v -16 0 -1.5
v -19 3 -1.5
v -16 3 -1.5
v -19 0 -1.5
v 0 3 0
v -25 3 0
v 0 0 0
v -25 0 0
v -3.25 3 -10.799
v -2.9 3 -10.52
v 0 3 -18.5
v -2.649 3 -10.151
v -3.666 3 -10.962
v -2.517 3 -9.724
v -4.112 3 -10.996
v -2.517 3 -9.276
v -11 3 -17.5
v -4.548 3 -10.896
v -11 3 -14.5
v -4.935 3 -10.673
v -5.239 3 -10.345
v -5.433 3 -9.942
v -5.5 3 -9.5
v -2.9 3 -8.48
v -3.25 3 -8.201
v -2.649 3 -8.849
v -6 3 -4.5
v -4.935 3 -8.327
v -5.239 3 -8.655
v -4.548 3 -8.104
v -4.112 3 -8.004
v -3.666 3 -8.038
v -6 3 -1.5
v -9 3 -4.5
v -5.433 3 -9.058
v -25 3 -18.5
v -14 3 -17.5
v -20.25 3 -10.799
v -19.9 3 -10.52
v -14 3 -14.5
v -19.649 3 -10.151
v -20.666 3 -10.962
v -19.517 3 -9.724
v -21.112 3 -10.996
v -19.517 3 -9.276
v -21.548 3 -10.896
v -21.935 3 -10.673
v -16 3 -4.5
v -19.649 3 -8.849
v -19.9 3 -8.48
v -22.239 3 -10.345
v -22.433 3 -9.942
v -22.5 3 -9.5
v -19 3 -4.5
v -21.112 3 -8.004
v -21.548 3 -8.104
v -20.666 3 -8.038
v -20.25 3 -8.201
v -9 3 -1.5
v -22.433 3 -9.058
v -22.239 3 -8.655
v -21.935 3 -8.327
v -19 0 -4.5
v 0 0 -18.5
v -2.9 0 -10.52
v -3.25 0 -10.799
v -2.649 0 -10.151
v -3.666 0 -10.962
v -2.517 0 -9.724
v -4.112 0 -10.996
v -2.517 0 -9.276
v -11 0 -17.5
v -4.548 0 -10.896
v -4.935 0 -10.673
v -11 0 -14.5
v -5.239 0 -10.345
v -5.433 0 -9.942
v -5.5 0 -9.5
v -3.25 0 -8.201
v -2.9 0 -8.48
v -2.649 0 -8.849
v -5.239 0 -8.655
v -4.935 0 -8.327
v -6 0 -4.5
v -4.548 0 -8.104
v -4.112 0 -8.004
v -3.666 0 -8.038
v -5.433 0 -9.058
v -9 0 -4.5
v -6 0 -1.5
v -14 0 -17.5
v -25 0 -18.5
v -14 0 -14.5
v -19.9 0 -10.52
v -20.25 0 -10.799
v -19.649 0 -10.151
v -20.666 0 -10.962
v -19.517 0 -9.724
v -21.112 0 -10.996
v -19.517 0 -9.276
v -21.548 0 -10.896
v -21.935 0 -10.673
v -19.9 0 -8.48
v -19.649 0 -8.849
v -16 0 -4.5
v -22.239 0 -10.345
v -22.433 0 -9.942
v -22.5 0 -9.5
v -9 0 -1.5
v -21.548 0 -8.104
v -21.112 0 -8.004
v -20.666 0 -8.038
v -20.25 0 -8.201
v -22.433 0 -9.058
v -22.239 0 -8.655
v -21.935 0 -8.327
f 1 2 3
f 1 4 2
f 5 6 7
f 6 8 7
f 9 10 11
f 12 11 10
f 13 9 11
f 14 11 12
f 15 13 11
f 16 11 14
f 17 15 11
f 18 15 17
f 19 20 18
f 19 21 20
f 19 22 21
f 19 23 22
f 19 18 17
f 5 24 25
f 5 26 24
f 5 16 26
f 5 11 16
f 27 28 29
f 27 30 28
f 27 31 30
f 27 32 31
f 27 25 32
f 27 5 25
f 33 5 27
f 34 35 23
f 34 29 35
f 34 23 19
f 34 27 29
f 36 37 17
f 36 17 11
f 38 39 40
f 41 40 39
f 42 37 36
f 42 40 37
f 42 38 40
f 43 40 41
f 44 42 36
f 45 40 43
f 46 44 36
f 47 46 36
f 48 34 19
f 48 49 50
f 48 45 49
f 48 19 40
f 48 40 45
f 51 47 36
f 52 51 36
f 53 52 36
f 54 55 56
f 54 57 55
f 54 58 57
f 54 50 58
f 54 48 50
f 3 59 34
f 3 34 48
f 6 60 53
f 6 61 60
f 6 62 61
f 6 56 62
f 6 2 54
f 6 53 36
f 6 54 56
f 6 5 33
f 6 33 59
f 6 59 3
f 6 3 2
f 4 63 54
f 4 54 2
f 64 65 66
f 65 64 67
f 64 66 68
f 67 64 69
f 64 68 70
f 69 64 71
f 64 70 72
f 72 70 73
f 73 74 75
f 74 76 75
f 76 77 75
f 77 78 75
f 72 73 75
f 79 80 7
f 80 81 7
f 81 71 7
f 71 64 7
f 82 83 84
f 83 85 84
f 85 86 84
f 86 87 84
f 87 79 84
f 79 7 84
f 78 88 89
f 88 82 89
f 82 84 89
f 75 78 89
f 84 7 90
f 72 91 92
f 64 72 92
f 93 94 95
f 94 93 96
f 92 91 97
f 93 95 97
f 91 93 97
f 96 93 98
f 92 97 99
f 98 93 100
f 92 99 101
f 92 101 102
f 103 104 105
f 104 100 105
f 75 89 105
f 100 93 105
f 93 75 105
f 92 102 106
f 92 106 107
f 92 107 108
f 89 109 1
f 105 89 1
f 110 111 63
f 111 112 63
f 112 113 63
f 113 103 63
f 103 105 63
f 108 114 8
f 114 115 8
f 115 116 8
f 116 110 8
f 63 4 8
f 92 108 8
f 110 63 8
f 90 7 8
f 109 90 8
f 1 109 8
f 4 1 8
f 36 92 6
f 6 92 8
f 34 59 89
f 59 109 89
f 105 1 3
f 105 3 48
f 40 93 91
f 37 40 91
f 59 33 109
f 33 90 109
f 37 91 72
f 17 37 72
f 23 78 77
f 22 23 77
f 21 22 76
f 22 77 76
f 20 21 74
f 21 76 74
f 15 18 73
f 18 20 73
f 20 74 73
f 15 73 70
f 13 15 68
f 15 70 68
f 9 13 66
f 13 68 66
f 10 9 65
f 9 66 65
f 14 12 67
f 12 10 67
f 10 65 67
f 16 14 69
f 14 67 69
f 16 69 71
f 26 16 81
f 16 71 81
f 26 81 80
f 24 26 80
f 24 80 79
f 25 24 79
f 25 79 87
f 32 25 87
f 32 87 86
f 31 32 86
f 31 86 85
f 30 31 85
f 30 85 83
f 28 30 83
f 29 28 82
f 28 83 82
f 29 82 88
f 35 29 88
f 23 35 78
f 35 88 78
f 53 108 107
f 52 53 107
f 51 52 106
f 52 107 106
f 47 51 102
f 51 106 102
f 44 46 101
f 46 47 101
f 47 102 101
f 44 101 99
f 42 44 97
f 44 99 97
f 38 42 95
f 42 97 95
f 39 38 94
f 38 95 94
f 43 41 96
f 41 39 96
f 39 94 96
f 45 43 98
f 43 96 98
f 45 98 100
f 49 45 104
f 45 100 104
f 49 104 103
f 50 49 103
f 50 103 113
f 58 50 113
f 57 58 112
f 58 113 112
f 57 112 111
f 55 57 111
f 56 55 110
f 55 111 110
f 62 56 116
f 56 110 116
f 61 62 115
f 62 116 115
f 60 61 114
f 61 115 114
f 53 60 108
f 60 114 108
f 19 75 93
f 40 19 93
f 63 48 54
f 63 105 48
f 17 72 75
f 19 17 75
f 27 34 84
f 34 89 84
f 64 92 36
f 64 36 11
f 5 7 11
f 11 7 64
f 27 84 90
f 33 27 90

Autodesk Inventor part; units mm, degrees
ref_plane "YZ Plane" through (0, 0, 0) normal (1, 0, 0) x (0, 1, 0)
ref_plane "XZ Plane" through (0, 0, 0) normal (0, 1, 0) x (-1, 0, 0)
ref_plane "XY Plane" through (0, 0, 0) normal (0, 0, 1) x (1, 0, 0)
sketch "草圖1" plane through (0, 0, 0) normal (0, 1, 0) x (-1, 0, 0)
  line L0 (25, 0) -> (0, 0)
  line L1 (0, 0) -> (0, -20)
  line L2 (0, -20) -> (25, -20)
  line L3 (25, -20) -> (25, 0)
  line L4 (6.5, -14.5) -> (18.5, -14.5) construction
  line L5 (5.5, -17.5) -> (8.5, -17.5)
  line L6 (8.5, -17.5) -> (8.5, -14.5)
  line L7 (8.5, -14.5) -> (5.5, -14.5)
  line L8 (5.5, -14.5) -> (5.5, -17.5)
  line L9 (9, -4.5) -> (16, -4.5) construction
  line L10 (9, -4.5) -> (6, -4.5)
  line L11 (6, -4.5) -> (6, -1.5)
  line L12 (6, -1.5) -> (9, -1.5)
  line L13 (9, -1.5) -> (9, -4.5)
  line L14 (16, -4.5) -> (19, -4.5)
  line L15 (19, -4.5) -> (19, -1.5)
  line L16 (19, -1.5) -> (16, -1.5)
  line L17 (16, -1.5) -> (16, -4.5)
  line L18 (16.5, -17.5) -> (19.5, -17.5)
  line L19 (19.5, -17.5) -> (19.5, -14.5)
  line L20 (19.5, -14.5) -> (16.5, -14.5)
  line L21 (16.5, -14.5) -> (16.5, -17.5)
  circle A0 centre (4, -9.5) radius 1.5
  circle A1 centre (21, -9.5) radius 1.5
  line L22 (11, -14.5) -> (14, -14.5)
  line L23 (14, -14.5) -> (14, -17.5)
  line L24 (14, -17.5) -> (11, -17.5)
  line L25 (11, -17.5) -> (11, -14.5)
  line L26 (25, -18.5) -> (0, -18.5)
  point P0 (19, 16.3854)
  point P1 (12.5, -17.5)
  point P2 (12.5, -14.5)
  dimension "d0" = 25
  dimension "d1" = 20
  dimension "d2" = 3
  dimension "d3" = 3
  dimension "d4" = 0
  dimension "d5" = 10
  dimension "d6" = 3
  dimension "d7" = 3
  dimension "d8" = 3
  dimension "d9" = 3
  dimension "d10" = 3
  dimension "d11" = 3
  dimension "d12" = 3
  dimension "d13" = 5
  dimension "d14" = 5
  dimension "d15" = 8
  dimension "d16" = 2.5
  dimension "d18" = 7
  dimension "d22" = 5.5
  dimension "d23" = 5.5
  dimension "d24" = 6
  dimension "d25" = 3
  dimension "d26" = 3
  dimension "d27" = 1
extrude "擠出1" add sketch "草圖1" along normal blind 3 contours L3 L26 L1 L0 | L8 L7 L6 L5 | L21 L20 L19 L18
sketch "草圖2" plane through (0, 3, 0) normal (0, 1, 0) x (1, 0, 0)
  line L0 (0, 0) -> (0, 18.5) projected
  line L1 (-25, 18.5) -> (-25, 0) projected
  line L2 (-25, 0) -> (0, 0) projected
  circle A0 centre (-21, 9.5) radius 1.5 projected
  circle A1 centre (-4, 9.5) radius 1.5 projected
  line L3 (-11, 14.5) -> (-14, 14.5) projected
  line L4 (-14, 14.5) -> (-14, 17.5) projected
  line L5 (-14, 17.5) -> (-11, 17.5) projected
  line L6 (-11, 17.5) -> (-11, 14.5) projected
  line L7 (-9, 1.5) -> (-9, 4.5) projected
  line L8 (-9, 4.5) -> (-6, 4.5) projected
  line L9 (-6, 4.5) -> (-6, 1.5) projected
  line L10 (-6, 1.5) -> (-9, 1.5) projected
  line L11 (-16, 4.5) -> (-16, 1.5) projected
  line L12 (-16, 1.5) -> (-19, 1.5) projected
  line L13 (-19, 1.5) -> (-19, 4.5) projected
  line L14 (-19, 4.5) -> (-16, 4.5) projected
  line L15 (0, 18.5) -> (-25, 18.5) projected
properties part number "motorbase_3"
